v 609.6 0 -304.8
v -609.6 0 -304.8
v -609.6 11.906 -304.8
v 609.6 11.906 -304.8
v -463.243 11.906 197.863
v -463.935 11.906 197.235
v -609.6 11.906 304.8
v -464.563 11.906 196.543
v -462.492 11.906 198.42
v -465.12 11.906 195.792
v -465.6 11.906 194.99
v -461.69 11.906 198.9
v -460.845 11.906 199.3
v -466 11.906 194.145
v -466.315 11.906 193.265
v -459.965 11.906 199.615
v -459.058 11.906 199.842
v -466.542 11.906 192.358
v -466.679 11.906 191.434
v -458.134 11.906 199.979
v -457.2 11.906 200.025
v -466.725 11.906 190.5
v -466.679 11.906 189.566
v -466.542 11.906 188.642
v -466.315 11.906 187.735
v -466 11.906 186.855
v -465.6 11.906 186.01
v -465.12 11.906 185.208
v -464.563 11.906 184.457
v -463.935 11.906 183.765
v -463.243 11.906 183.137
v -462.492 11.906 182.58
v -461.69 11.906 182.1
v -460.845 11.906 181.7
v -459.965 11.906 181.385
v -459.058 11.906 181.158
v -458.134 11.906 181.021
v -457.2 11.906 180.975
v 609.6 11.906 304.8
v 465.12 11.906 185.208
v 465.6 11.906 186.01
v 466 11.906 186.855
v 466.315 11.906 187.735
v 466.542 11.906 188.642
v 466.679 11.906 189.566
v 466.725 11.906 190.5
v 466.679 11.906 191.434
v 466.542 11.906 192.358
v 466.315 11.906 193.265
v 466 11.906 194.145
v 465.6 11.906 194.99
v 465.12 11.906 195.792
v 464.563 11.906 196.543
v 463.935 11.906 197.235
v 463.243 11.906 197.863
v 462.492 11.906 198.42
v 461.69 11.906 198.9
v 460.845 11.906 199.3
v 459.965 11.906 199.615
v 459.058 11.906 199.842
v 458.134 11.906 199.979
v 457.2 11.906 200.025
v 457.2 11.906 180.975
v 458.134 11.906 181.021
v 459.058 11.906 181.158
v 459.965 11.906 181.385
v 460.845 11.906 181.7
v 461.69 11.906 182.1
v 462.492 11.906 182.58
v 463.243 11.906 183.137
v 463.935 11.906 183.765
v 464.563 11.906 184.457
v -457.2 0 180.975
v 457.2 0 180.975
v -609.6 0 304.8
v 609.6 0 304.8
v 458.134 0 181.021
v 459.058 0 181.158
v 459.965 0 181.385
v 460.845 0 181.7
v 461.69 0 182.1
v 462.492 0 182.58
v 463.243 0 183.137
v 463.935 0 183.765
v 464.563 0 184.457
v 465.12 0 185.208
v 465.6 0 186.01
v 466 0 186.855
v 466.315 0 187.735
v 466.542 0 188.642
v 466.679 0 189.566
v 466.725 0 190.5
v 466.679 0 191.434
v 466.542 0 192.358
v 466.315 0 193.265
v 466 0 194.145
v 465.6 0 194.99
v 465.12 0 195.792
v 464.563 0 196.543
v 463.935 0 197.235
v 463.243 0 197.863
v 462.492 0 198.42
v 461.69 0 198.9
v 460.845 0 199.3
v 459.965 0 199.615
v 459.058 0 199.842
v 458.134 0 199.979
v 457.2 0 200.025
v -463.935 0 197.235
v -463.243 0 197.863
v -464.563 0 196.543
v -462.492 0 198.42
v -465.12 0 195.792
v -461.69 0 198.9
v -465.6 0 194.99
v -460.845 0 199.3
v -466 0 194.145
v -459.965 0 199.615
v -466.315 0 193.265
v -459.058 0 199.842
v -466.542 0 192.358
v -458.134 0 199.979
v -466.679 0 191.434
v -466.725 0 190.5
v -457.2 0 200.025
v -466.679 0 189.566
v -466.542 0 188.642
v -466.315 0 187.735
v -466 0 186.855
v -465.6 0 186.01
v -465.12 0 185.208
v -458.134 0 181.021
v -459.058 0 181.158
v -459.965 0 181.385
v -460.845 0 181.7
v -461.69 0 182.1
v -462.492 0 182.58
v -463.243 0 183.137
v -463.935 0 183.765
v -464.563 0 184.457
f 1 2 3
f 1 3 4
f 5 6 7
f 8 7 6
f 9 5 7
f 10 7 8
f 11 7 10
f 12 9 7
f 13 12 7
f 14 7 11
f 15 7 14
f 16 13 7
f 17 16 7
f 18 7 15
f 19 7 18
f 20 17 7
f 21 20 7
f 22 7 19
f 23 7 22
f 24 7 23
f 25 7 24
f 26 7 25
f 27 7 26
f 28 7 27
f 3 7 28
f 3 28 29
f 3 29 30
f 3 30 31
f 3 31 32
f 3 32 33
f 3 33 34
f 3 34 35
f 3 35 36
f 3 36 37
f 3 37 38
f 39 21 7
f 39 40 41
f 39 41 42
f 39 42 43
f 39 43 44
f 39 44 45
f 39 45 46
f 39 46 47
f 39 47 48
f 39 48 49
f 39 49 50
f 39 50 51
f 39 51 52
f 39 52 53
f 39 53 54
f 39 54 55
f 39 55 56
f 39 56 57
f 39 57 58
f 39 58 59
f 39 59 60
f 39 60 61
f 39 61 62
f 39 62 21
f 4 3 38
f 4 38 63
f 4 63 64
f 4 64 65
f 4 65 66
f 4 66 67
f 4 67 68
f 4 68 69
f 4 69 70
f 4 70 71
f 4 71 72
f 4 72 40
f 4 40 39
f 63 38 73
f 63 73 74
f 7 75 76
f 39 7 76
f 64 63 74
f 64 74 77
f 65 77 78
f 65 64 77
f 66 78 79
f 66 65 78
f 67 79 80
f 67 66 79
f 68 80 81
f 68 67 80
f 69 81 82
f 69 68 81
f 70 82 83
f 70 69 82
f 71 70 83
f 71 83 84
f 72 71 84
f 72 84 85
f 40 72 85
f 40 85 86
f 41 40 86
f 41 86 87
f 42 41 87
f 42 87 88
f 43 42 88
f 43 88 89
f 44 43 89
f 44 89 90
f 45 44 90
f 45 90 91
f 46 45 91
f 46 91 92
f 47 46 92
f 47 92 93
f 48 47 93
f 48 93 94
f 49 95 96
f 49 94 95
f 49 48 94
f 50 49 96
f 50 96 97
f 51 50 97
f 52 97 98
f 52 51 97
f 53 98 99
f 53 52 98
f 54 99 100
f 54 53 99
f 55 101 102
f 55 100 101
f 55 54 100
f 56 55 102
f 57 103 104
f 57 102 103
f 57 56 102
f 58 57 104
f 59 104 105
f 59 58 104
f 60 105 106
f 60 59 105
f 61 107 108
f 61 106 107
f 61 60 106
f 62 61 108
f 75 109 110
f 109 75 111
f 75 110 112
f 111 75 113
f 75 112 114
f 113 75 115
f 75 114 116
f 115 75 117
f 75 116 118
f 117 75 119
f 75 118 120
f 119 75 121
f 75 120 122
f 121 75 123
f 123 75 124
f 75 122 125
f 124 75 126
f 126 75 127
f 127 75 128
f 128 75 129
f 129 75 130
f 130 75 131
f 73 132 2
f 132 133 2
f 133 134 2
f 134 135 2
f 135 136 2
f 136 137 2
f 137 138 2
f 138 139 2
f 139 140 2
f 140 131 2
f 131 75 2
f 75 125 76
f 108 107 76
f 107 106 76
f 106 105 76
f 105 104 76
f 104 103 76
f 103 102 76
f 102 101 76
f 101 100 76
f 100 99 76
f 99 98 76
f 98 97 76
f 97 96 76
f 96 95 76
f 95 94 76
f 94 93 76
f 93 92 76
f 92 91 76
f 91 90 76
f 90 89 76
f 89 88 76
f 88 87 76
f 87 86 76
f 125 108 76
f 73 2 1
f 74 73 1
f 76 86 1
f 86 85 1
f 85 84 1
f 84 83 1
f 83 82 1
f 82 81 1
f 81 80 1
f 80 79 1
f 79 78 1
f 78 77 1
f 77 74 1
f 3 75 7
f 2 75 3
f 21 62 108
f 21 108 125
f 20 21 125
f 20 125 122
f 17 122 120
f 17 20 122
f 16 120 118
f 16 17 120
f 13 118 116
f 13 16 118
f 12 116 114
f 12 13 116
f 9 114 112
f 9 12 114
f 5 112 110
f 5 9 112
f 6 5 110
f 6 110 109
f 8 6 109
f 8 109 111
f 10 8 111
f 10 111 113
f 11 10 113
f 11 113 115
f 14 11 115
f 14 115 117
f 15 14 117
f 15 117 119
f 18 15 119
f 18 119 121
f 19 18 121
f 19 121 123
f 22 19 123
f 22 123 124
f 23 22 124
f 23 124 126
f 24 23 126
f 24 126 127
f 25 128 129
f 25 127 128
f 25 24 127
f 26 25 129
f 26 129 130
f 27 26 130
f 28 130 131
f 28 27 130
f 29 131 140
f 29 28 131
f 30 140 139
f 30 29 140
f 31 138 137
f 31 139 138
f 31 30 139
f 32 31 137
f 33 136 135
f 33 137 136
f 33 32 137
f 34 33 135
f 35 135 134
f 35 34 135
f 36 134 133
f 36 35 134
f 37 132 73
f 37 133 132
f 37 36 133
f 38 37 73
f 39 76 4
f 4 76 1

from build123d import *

# Parameters (mm, degrees)
SKETCH1_W           = 1219.2
SKETCH1_H           = 609.6
BOSS_EXTRUDE1_DEPTH = 11.90625
CUT_EXTRUDE1_DEPTH  = 12.90625


with BuildPart() as part:
    # Sketch1 → Boss-Extrude1 (new body)
    with BuildSketch(Plane(origin=(0, 0, 0), x_dir=(1, 0, 0), z_dir=(0, 1, 0))):
        Rectangle(SKETCH1_W, SKETCH1_H)
    extrude(amount=BOSS_EXTRUDE1_DEPTH)

    # Sketch2 → Cut-Extrude1 (cut, through all)
    with BuildSketch(Plane(origin=(0, 11.90625, 0), x_dir=(1, 0, 0), z_dir=(0, 1, 0))):
        with BuildLine():
            Line((-457.2, -180.975), (457.2, -180.975))
            ThreePointArc((457.2, -180.975), (466.725, -190.5), (457.2, -200.025))
            Line((457.2, -200.025), (-457.2, -200.025))
            ThreePointArc((-457.2, -200.025), (-466.725, -190.5), (-457.2, -180.975))
        make_face()
    extrude(amount=-CUT_EXTRUDE1_DEPTH, mode=Mode.SUBTRACT)


solid = part.part
